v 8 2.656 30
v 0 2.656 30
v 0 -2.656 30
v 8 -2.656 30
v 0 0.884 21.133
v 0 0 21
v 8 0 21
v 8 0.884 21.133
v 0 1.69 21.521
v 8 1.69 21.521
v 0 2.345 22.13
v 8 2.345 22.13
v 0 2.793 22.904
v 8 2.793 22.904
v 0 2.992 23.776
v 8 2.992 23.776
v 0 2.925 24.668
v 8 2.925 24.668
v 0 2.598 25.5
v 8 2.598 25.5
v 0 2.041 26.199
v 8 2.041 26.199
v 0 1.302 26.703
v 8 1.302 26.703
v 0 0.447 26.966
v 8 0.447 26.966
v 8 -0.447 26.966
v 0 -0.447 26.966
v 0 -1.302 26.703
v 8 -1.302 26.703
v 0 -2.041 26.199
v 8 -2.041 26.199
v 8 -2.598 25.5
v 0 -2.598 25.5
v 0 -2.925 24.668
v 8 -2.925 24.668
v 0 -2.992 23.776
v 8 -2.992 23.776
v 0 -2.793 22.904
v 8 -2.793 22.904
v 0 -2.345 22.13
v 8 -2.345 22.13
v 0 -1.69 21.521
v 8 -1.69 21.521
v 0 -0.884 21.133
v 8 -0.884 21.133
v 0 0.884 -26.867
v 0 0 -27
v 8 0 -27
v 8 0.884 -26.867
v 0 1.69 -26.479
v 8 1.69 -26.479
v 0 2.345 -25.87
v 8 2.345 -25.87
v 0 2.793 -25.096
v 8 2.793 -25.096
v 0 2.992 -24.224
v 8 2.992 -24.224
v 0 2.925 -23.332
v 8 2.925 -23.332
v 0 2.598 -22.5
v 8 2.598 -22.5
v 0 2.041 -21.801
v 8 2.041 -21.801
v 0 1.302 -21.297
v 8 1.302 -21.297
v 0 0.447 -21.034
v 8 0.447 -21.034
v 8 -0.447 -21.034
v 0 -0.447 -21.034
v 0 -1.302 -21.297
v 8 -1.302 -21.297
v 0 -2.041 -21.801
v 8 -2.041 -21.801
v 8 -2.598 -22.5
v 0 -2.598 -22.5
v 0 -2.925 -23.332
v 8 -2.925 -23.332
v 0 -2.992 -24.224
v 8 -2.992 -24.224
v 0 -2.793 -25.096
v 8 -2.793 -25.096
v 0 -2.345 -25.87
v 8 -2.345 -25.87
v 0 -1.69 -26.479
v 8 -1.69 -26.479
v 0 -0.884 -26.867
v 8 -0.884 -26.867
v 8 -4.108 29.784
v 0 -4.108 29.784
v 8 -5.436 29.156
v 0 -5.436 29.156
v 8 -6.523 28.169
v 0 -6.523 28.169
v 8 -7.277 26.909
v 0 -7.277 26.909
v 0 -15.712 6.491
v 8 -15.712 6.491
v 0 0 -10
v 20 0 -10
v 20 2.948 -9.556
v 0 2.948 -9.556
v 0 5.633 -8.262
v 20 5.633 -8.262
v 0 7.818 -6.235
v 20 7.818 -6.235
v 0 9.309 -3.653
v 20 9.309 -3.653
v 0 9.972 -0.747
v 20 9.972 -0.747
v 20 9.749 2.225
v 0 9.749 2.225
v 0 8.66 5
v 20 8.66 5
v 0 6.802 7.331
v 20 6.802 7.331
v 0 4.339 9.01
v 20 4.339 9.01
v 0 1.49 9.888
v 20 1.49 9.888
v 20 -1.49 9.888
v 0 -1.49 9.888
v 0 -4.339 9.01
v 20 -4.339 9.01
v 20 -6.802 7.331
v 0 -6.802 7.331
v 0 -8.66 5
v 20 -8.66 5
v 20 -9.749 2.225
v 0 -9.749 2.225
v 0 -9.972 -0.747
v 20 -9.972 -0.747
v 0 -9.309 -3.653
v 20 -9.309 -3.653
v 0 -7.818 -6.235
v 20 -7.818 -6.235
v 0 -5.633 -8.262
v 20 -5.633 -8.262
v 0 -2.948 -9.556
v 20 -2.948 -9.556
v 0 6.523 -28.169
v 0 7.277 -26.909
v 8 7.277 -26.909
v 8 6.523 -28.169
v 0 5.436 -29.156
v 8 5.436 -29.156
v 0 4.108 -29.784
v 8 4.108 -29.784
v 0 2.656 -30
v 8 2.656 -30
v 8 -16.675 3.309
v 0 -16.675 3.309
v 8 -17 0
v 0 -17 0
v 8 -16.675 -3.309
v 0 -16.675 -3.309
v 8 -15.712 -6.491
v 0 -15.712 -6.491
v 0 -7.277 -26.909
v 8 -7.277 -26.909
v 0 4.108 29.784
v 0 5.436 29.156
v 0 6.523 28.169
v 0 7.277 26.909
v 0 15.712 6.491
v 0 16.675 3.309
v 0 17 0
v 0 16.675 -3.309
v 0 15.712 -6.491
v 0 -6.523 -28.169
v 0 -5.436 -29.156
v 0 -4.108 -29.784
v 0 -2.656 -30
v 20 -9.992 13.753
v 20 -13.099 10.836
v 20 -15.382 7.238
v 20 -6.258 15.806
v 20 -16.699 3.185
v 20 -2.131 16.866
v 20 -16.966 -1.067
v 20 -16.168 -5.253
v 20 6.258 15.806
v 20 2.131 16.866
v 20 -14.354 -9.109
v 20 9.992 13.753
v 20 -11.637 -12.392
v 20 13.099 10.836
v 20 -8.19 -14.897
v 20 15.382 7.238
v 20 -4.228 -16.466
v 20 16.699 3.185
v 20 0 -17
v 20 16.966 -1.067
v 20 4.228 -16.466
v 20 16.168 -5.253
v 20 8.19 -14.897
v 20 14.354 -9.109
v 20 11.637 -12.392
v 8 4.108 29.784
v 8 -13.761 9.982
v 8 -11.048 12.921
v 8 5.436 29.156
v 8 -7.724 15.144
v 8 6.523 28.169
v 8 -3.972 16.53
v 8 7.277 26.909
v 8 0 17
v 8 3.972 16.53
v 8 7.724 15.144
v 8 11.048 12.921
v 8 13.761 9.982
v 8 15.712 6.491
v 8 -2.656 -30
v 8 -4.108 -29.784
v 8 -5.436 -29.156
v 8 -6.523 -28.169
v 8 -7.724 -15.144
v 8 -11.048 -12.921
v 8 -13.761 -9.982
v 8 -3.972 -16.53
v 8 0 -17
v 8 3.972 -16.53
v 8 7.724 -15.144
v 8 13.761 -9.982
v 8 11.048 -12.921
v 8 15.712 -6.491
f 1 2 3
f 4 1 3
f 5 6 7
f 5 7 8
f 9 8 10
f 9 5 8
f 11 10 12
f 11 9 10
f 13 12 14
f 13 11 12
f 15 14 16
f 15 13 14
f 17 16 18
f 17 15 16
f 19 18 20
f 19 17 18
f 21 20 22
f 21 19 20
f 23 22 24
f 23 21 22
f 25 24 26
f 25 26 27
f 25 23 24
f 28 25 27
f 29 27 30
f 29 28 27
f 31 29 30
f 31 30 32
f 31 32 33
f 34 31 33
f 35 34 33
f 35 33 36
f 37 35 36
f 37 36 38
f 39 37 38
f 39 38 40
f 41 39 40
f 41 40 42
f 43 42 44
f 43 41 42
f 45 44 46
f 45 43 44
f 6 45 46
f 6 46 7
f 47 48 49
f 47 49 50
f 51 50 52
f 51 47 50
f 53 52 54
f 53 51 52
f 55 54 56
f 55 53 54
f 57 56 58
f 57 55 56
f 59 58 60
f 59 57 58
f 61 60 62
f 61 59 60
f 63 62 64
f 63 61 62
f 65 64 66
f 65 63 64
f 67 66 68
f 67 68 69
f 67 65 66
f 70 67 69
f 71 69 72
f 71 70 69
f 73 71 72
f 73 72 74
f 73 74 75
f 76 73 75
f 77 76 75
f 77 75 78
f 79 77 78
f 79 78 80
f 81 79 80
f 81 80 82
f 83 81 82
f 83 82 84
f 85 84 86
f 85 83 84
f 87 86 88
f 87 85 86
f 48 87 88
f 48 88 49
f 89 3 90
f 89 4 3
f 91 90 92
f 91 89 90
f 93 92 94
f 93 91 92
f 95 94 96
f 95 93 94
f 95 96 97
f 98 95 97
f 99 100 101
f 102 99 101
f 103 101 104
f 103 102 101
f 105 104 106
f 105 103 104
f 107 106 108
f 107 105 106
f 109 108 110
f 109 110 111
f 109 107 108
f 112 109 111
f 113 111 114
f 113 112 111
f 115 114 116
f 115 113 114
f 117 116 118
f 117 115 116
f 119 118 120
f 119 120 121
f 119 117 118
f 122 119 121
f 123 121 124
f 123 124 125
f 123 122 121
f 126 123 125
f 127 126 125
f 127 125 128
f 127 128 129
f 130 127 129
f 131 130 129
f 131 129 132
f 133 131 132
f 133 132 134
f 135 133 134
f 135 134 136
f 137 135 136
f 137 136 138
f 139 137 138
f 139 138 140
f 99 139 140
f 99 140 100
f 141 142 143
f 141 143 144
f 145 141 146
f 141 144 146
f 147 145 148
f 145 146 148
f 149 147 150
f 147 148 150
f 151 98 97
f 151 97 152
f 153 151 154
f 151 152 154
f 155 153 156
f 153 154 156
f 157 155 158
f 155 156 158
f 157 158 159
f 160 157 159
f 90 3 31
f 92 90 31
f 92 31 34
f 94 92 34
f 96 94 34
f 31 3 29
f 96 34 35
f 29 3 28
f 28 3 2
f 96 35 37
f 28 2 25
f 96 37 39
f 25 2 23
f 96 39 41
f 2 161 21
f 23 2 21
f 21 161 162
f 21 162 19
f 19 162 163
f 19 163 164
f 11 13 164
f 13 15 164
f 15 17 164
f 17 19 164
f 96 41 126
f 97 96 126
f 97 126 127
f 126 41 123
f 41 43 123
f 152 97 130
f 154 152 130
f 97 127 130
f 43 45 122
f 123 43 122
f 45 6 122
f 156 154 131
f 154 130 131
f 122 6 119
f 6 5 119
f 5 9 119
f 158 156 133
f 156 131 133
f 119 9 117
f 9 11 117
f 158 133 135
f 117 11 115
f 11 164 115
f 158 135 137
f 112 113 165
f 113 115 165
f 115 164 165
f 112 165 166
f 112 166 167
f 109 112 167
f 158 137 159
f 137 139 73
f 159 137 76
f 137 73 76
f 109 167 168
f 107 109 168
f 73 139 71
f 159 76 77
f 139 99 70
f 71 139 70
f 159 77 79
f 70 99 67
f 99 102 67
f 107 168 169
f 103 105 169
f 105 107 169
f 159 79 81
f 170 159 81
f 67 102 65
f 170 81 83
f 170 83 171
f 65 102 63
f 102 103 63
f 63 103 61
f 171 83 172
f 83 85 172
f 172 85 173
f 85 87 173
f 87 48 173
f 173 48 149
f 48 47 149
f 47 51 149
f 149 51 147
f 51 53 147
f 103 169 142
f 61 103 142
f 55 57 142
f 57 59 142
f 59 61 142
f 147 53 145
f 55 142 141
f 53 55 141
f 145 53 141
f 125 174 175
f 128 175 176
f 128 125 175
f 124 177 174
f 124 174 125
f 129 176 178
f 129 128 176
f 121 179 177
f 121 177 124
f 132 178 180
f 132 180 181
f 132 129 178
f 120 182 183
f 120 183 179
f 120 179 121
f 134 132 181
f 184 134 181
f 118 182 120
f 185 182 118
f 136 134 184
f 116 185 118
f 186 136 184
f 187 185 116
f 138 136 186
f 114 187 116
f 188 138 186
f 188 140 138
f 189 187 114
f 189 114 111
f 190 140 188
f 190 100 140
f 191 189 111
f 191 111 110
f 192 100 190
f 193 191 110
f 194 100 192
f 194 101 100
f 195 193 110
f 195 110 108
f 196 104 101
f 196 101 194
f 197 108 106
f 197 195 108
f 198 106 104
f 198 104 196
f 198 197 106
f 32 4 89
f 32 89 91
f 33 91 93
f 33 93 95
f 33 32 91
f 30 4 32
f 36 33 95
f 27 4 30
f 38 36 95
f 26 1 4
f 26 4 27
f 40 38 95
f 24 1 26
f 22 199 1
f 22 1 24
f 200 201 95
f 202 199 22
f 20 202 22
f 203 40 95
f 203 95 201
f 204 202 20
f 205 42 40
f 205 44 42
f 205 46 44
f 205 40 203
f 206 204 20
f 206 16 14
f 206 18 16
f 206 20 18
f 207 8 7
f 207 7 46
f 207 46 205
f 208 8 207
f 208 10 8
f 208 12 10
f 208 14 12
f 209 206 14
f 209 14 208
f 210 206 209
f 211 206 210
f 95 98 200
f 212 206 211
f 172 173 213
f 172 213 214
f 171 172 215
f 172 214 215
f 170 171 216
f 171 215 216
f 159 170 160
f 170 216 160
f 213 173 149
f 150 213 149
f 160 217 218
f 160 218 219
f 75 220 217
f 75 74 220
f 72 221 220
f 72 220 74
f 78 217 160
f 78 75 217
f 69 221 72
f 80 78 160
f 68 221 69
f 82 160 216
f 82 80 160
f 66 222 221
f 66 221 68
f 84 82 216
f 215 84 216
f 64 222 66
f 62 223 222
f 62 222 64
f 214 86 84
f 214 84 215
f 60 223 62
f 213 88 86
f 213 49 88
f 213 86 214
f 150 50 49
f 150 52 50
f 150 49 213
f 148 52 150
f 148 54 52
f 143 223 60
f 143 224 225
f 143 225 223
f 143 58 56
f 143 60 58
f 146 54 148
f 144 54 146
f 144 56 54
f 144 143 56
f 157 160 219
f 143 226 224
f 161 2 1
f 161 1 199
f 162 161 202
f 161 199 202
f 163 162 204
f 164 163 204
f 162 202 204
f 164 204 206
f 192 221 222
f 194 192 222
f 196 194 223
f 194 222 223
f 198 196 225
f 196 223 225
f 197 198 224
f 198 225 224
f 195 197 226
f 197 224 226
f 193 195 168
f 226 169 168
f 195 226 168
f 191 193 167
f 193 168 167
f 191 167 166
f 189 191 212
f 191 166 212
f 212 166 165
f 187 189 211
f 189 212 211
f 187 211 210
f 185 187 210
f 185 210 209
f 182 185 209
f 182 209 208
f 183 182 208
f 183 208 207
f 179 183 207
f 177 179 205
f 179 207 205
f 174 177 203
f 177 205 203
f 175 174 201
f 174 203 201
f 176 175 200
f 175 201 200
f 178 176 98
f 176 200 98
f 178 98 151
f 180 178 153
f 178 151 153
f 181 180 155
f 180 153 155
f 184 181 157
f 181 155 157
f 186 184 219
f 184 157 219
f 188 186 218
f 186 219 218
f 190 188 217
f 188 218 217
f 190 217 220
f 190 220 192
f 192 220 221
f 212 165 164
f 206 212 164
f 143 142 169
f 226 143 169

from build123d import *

# Parameters (mm, degrees)
SKETCH1_R           = 10
SKETCH1_R_2         = 3
BOSS_EXTRUDE1_DEPTH = 8
SKETCH3_R           = 17
SKETCH3_R_2         = 10
BOSS_EXTRUDE2_DEPTH = 20
FILLET1_R           = 5


with BuildPart() as part:
    # Sketch1 → Boss-Extrude1 (new body)
    with BuildSketch(Plane(origin=(0, 0, 0), x_dir=(0, 0, -1), z_dir=(1, 0, 0))):
        with BuildLine():
            Line((30, -6), (30, 6))
            Line((30, 6), (6.490927502, 15.712029155))
            ThreePointArc((6.490927502, 15.712029155), (0, 17), (-6.490927502, 15.712029155))
            Line((-6.490927502, 15.712029155), (-30, 6))
            Line((-30, 6), (-30, -6))
            Line((-30, -6), (-6.490927502, -15.712029155))
            ThreePointArc((-6.490927502, -15.712029155), (0, -17), (6.490927502, -15.712029155))
            Line((6.490927502, -15.712029155), (30, -6))
        make_face()
        Circle(SKETCH1_R, mode=Mode.SUBTRACT)
        with Locations((-24, 0)):
            Circle(SKETCH1_R_2, mode=Mode.SUBTRACT)
        with Locations((24, 0)):
            Circle(SKETCH1_R_2, mode=Mode.SUBTRACT)
    extrude(amount=BOSS_EXTRUDE1_DEPTH)

    # Sketch3 → Boss-Extrude2 (add)
    with BuildSketch(Plane(origin=(0, 0, 0), x_dir=(0, 0, -1), z_dir=(1, 0, 0))):
        Circle(SKETCH3_R)
        Circle(SKETCH3_R_2, mode=Mode.SUBTRACT)
    extrude(amount=BOSS_EXTRUDE2_DEPTH)

    # Fillet1
    fillet1_edges = [part.edges().sort_by_distance(p)[0] for p in [
        (4, 6, -30),
        (4, -6, -30),
        (4, -6, 30),
        (4, 6, 30),
    ]]
    fillet(fillet1_edges, radius=FILLET1_R)


solid = part.part
